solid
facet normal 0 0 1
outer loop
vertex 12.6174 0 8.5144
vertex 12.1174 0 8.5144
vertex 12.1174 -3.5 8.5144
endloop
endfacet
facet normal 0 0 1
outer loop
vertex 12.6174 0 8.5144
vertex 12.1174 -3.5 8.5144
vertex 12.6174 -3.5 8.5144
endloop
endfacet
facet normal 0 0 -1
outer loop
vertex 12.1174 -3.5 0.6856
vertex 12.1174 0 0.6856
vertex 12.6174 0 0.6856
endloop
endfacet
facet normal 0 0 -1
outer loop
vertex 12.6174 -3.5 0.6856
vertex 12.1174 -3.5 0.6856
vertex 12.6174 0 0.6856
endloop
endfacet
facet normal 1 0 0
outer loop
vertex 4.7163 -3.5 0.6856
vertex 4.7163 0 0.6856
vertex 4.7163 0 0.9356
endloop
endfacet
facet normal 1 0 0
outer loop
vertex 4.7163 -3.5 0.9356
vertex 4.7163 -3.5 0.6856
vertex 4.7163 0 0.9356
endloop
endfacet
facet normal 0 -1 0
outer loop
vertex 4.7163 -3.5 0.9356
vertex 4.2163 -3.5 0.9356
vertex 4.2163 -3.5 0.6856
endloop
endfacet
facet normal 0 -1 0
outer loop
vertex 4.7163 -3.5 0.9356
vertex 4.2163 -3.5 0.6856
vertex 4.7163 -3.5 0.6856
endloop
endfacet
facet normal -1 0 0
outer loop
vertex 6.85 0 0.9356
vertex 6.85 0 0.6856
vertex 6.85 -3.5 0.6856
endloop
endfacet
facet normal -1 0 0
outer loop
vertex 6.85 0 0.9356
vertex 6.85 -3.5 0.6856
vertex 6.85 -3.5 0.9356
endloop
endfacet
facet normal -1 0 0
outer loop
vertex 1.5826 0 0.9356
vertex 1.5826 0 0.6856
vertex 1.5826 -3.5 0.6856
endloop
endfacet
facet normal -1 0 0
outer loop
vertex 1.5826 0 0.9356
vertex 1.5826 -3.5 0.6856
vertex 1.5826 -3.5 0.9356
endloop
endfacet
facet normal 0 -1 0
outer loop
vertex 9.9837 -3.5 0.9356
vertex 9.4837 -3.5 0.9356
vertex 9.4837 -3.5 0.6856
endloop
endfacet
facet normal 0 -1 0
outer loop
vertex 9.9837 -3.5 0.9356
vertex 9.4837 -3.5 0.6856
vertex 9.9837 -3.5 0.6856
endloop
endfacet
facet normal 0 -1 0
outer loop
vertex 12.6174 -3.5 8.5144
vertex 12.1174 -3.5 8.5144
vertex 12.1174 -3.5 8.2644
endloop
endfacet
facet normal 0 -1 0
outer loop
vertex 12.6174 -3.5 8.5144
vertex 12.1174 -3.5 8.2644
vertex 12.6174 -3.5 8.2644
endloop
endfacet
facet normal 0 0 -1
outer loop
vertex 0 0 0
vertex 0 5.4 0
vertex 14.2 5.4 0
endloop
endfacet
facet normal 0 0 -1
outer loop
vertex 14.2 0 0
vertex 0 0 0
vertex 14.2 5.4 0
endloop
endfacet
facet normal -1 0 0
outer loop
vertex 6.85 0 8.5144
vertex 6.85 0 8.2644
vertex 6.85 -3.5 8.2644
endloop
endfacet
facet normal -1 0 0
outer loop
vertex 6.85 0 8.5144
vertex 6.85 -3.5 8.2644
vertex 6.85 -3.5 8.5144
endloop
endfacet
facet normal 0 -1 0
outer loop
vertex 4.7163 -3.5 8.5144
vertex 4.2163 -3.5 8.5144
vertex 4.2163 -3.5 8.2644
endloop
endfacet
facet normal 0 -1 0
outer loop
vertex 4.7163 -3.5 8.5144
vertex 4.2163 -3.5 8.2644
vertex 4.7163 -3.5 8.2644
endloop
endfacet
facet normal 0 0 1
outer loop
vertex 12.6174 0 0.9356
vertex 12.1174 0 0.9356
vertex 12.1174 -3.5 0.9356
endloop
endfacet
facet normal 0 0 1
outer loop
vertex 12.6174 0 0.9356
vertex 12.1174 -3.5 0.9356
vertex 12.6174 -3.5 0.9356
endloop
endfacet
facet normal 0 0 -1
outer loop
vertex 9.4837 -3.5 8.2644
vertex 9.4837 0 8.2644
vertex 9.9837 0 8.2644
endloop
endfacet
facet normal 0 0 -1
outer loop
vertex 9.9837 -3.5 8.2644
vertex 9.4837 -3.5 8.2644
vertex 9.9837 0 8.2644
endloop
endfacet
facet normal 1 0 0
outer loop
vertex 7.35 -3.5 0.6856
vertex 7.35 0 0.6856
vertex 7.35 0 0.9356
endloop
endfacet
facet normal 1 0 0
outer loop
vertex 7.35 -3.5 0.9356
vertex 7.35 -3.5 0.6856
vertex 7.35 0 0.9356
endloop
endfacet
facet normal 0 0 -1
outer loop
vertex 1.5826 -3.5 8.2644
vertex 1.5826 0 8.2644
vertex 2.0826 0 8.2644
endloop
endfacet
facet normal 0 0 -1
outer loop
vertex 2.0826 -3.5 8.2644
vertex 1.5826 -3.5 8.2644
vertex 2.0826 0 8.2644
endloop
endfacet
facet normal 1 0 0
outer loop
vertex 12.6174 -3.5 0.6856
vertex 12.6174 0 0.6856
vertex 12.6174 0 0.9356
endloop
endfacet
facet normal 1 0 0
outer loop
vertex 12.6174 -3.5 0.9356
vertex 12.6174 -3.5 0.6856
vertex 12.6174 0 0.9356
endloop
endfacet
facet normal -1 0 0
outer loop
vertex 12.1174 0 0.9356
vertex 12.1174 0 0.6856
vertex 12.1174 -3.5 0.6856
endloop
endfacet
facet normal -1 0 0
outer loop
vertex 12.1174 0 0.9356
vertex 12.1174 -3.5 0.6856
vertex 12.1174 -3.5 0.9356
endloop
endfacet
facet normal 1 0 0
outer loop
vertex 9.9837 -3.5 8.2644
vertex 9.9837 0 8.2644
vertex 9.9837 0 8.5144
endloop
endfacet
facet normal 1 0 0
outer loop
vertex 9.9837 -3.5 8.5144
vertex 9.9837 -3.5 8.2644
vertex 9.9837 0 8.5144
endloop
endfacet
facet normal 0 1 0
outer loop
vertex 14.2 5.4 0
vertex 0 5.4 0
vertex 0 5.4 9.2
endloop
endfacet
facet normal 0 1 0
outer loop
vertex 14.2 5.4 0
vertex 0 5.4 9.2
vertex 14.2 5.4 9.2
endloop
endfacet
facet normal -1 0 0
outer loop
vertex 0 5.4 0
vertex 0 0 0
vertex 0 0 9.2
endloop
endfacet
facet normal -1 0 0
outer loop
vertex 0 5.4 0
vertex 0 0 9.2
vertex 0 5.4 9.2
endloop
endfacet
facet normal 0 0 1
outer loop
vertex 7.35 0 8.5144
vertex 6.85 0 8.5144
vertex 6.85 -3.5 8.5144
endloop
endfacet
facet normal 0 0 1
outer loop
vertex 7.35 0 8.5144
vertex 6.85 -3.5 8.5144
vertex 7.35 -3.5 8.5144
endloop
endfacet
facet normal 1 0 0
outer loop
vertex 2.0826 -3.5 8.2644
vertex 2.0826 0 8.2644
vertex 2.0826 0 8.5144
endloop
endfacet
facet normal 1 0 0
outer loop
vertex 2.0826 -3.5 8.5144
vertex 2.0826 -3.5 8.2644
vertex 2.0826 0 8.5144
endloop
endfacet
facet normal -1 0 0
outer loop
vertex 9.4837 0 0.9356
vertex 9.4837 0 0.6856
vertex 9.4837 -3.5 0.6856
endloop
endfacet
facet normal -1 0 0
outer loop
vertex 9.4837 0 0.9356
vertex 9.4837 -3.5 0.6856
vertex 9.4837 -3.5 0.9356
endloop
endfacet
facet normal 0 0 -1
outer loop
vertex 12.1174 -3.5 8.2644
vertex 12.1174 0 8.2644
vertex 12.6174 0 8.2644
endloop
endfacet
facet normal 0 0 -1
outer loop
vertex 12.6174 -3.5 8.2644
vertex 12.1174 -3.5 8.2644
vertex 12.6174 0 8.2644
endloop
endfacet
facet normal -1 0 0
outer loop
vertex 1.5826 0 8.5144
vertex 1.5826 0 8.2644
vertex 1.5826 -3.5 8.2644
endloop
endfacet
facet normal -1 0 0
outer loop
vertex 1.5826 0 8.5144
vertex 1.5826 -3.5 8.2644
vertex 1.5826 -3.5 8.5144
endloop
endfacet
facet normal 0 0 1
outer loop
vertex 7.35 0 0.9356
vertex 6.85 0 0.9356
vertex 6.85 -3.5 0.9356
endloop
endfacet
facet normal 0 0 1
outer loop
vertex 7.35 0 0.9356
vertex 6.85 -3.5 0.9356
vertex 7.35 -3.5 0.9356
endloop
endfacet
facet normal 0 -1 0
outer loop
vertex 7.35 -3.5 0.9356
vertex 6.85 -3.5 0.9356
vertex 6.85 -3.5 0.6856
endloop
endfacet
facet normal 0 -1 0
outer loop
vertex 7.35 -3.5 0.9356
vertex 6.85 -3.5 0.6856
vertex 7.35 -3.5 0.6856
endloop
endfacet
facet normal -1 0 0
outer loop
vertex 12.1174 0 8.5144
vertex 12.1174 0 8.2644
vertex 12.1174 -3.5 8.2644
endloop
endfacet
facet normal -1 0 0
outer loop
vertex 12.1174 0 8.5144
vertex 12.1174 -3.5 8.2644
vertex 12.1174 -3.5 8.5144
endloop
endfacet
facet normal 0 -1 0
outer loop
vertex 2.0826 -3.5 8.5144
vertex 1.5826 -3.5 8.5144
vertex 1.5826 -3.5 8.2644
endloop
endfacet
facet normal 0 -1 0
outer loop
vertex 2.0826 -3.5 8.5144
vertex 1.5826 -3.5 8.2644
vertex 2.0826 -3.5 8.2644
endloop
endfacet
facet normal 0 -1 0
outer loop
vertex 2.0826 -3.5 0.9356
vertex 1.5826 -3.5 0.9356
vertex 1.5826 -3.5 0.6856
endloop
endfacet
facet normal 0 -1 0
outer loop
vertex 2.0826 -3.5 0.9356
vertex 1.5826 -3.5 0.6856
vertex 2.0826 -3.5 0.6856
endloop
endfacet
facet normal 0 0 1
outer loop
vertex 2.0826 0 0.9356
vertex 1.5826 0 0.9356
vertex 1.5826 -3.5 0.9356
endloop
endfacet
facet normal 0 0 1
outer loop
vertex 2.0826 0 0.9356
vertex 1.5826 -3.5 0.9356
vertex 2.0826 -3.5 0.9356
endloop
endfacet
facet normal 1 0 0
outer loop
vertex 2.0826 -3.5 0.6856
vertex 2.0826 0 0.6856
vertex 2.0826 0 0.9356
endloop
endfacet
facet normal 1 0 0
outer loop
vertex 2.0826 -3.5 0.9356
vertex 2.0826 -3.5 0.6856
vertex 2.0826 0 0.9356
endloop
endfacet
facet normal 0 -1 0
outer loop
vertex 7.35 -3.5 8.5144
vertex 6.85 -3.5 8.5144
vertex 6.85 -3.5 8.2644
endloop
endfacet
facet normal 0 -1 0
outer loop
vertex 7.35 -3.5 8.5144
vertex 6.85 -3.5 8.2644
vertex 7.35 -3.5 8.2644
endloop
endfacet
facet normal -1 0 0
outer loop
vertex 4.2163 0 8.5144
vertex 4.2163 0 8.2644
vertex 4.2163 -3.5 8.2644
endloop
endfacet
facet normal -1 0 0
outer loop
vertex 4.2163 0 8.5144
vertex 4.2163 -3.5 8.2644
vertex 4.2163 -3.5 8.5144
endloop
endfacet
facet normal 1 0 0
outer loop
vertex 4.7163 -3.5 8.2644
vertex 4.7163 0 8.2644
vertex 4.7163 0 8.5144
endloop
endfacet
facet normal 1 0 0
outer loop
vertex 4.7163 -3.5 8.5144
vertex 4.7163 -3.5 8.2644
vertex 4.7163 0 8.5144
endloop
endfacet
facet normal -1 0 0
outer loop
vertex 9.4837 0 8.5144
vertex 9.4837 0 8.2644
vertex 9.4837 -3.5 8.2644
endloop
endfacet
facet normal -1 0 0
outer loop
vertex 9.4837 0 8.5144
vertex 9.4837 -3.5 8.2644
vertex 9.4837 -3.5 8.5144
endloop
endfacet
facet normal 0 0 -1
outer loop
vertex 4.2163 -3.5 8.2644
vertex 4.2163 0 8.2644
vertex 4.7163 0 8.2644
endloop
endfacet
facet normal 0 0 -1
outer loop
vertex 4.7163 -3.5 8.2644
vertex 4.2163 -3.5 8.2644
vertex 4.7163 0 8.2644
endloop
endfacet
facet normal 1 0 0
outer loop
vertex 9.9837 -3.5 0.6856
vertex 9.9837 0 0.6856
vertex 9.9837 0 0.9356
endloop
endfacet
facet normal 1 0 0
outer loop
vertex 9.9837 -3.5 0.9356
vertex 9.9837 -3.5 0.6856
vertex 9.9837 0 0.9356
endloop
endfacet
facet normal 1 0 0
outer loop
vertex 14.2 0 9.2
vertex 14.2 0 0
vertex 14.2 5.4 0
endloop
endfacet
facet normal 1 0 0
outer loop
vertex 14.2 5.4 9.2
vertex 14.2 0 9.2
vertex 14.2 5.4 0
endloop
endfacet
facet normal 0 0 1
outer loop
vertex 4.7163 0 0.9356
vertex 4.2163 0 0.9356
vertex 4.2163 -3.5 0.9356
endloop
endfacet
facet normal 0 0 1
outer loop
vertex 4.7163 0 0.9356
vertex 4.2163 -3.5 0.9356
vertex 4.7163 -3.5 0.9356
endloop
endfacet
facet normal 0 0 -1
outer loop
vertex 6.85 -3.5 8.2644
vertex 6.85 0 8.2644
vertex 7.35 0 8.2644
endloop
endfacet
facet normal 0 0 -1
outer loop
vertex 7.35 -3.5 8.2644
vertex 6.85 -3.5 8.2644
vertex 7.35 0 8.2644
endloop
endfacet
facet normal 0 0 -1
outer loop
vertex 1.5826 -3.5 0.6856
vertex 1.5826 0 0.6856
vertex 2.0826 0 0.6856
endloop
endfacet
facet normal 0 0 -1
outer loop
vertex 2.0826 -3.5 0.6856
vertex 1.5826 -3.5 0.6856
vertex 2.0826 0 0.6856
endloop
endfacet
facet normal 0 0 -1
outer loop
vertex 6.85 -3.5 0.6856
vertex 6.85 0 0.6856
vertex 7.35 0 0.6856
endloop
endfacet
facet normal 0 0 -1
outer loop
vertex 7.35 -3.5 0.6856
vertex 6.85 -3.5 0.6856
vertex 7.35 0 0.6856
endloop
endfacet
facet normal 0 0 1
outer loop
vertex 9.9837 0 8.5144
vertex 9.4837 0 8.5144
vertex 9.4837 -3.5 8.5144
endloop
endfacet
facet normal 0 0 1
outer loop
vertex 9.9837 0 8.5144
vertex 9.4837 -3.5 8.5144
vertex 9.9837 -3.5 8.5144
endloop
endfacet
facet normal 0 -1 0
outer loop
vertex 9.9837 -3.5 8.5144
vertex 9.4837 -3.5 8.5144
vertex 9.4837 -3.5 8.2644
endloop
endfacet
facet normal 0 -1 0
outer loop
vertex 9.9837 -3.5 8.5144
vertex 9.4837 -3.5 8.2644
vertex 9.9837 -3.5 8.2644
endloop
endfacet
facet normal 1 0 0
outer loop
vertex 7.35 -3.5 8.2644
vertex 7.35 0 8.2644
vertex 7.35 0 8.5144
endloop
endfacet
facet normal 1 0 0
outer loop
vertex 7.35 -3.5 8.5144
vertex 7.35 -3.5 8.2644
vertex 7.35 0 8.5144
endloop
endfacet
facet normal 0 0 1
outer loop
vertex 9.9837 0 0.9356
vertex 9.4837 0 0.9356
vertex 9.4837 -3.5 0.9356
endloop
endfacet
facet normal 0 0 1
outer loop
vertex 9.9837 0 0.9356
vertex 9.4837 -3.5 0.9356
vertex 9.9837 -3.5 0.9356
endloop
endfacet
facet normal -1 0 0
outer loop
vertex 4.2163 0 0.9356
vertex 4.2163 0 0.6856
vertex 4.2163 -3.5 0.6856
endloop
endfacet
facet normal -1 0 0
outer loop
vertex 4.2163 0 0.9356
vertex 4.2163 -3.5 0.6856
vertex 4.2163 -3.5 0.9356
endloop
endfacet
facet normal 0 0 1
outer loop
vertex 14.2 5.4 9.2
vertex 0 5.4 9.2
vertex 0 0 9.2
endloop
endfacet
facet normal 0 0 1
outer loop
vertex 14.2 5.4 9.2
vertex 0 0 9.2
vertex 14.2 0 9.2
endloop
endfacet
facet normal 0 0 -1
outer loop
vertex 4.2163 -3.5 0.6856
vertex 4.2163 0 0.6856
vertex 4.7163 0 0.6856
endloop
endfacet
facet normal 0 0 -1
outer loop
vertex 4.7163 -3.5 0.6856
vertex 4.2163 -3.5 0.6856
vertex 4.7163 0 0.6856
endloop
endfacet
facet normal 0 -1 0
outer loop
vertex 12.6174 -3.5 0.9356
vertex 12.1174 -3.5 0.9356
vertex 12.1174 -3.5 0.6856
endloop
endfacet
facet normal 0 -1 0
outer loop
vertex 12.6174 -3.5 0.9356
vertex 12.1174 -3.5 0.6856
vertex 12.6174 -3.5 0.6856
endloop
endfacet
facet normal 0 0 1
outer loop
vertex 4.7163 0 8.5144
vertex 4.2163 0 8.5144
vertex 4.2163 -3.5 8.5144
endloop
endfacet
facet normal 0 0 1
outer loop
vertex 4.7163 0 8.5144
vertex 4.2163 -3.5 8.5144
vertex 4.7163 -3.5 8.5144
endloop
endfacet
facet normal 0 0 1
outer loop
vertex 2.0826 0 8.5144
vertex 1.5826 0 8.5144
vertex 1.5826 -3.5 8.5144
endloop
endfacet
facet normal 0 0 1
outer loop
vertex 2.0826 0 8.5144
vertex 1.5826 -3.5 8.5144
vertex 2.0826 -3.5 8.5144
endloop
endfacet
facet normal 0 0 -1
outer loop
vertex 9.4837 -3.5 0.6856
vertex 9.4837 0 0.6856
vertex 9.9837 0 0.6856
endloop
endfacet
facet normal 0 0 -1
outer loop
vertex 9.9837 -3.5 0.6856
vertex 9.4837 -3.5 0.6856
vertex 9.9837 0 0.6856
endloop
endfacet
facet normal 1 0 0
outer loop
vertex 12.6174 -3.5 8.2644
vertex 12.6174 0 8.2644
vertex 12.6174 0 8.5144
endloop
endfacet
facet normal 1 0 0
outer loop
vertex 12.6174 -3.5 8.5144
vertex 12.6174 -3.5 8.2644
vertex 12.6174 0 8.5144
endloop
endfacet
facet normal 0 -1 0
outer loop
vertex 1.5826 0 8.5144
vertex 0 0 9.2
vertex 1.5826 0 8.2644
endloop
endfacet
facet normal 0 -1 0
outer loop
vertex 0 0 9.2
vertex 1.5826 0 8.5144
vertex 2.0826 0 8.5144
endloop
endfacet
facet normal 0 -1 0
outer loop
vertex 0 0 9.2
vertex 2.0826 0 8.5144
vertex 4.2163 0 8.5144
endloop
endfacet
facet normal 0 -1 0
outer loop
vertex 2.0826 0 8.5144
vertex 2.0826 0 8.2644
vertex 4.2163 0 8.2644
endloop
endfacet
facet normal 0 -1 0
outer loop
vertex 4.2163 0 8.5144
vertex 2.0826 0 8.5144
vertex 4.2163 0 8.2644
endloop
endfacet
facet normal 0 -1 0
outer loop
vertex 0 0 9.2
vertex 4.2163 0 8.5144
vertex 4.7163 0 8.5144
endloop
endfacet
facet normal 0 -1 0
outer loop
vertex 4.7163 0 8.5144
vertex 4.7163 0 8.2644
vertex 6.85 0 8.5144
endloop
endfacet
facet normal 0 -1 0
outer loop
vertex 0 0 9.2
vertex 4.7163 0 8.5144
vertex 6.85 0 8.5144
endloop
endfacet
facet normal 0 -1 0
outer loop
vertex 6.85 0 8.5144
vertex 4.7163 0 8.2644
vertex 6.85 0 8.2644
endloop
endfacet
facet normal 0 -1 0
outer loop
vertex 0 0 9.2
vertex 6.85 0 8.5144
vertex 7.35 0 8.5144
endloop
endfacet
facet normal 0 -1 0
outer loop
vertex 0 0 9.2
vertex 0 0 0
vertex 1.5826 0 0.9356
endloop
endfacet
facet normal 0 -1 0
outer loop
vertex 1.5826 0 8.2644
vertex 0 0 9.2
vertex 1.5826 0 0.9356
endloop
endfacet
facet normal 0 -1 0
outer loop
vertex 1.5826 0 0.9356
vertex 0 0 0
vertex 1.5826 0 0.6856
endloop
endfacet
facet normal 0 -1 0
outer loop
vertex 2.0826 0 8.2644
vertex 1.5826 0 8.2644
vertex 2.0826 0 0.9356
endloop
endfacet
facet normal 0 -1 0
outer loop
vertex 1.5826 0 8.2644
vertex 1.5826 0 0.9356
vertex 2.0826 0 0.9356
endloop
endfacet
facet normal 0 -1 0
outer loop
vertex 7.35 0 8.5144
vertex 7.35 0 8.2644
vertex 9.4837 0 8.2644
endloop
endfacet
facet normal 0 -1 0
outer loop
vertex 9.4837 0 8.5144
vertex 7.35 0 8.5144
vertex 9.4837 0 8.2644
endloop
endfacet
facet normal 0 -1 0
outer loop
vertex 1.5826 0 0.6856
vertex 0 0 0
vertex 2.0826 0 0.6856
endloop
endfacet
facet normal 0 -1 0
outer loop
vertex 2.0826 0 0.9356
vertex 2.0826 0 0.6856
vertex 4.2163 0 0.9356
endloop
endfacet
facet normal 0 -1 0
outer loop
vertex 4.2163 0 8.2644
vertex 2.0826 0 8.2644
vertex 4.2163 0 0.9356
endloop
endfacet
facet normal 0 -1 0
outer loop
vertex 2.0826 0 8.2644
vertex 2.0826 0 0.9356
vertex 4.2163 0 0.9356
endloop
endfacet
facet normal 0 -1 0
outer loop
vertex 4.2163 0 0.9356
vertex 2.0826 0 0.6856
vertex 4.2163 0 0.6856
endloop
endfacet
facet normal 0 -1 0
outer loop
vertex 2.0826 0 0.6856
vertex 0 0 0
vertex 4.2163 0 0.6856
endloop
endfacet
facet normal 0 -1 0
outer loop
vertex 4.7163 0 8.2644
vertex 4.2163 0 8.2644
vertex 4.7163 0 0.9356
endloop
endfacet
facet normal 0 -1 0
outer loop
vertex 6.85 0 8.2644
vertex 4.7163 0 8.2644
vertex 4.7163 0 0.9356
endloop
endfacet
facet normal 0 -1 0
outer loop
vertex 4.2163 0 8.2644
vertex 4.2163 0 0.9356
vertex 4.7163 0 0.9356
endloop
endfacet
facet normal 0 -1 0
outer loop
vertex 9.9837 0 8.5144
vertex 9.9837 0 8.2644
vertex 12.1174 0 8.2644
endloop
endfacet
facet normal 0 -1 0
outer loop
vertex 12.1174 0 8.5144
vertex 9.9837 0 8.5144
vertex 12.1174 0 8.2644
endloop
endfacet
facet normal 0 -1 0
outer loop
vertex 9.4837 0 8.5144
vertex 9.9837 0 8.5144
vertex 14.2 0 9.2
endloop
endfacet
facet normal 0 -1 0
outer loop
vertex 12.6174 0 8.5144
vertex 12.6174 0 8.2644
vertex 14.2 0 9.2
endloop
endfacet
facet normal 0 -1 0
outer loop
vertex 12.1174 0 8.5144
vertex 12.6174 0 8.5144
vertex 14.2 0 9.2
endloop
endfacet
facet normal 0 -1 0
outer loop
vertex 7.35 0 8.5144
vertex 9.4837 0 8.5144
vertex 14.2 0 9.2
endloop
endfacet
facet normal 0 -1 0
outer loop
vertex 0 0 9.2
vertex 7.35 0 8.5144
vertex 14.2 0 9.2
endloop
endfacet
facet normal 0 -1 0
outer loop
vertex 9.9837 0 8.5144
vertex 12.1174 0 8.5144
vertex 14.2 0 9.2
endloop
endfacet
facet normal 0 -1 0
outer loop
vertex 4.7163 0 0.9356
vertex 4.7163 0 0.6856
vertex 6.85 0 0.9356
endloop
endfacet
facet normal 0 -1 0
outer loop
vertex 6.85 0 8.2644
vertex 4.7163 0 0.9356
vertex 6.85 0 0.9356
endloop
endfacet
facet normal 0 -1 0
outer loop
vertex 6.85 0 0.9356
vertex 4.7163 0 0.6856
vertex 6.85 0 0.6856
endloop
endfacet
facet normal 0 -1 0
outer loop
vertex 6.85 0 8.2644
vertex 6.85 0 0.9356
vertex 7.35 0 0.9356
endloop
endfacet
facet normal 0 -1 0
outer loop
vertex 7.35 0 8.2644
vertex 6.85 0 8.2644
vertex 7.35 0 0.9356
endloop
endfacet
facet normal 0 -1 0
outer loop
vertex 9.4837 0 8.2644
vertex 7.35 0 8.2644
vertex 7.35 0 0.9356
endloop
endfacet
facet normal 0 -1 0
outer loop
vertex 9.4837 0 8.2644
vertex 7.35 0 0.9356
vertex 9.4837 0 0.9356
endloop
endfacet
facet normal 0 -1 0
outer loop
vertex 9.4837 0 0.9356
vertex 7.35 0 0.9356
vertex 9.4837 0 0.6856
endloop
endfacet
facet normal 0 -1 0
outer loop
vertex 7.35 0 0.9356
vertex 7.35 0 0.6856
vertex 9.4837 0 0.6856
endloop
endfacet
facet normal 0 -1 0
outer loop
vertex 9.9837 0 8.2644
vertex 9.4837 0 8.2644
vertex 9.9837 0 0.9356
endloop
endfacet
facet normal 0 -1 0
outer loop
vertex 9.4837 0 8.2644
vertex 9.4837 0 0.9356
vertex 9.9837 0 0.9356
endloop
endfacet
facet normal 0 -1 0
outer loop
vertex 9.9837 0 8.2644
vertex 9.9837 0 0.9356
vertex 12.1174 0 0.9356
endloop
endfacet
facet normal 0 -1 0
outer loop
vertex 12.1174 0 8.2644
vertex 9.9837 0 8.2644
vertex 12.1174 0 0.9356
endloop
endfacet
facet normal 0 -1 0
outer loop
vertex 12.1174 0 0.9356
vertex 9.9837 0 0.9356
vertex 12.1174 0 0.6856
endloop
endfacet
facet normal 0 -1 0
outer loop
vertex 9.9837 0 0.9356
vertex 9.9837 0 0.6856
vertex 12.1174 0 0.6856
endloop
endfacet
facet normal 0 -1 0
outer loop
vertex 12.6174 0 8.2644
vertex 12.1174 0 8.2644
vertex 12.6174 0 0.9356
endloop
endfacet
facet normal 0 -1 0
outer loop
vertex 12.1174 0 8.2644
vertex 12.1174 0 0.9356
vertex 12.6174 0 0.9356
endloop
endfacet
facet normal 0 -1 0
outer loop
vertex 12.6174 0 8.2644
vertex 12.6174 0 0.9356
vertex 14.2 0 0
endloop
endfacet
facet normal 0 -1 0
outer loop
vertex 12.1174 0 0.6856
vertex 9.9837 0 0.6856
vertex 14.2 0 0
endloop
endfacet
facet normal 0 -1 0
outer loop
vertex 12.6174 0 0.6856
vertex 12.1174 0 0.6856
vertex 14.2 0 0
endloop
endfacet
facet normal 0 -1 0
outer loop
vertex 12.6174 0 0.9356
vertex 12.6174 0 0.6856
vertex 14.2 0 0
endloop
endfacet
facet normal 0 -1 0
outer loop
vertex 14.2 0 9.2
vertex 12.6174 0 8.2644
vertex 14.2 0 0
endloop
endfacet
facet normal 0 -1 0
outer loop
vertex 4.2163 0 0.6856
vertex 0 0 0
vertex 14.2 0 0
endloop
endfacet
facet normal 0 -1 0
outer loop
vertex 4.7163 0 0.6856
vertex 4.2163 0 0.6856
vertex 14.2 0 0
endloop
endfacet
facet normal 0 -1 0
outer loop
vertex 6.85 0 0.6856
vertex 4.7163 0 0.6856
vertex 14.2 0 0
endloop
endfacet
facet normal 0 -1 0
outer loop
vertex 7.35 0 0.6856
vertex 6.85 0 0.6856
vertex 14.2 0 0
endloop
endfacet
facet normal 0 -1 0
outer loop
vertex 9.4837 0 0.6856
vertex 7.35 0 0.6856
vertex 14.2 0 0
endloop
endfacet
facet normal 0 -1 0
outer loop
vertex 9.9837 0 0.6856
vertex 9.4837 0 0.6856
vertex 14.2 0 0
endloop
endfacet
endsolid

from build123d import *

# Parameters (mm, degrees)
SKETCH1_W           = 14.2
SKETCH1_H           = 5.4
BOSS_EXTRUDE1_DEPTH = 9.2
SKETCH2_W           = 0.5
SKETCH2_H           = 0.25
BOSS_EXTRUDE2_DEPTH = 3.5


with BuildPart() as part:
    # Sketch1 → Boss-Extrude1 (new body)
    with BuildSketch(Plane.XY):
        with Locations((7.1, 2.7)):
            Rectangle(SKETCH1_W, SKETCH1_H)
    extrude(amount=BOSS_EXTRUDE1_DEPTH)

    # Sketch2 → Boss-Extrude2 (add)
    with BuildSketch(Plane.XZ):
        with Locations((1.832645657, 8.389413507)):
            Rectangle(SKETCH2_W, SKETCH2_H)
        with Locations((4.466322828, 8.389413507)):
            Rectangle(SKETCH2_W, SKETCH2_H)
        with Locations((7.1, 8.389413507)):
            Rectangle(SKETCH2_W, SKETCH2_H)
        with Locations((9.733677172, 8.389413507)):
            Rectangle(SKETCH2_W, SKETCH2_H)
        with Locations((12.367354343, 8.389413507)):
            Rectangle(SKETCH2_W, SKETCH2_H)
        with Locations((4.466322828, 0.810586493)):
            Rectangle(SKETCH2_W, SKETCH2_H)
        with Locations((7.1, 0.810586493)):
            Rectangle(SKETCH2_W, SKETCH2_H)
        with Locations((9.733677172, 0.810586493)):
            Rectangle(SKETCH2_W, SKETCH2_H)
        with Locations((12.367354343, 0.810586493)):
            Rectangle(SKETCH2_W, SKETCH2_H)
        with Locations((1.832645657, 0.810586493)):
            Rectangle(SKETCH2_W, SKETCH2_H)
    extrude(amount=BOSS_EXTRUDE2_DEPTH)


solid = part.part
